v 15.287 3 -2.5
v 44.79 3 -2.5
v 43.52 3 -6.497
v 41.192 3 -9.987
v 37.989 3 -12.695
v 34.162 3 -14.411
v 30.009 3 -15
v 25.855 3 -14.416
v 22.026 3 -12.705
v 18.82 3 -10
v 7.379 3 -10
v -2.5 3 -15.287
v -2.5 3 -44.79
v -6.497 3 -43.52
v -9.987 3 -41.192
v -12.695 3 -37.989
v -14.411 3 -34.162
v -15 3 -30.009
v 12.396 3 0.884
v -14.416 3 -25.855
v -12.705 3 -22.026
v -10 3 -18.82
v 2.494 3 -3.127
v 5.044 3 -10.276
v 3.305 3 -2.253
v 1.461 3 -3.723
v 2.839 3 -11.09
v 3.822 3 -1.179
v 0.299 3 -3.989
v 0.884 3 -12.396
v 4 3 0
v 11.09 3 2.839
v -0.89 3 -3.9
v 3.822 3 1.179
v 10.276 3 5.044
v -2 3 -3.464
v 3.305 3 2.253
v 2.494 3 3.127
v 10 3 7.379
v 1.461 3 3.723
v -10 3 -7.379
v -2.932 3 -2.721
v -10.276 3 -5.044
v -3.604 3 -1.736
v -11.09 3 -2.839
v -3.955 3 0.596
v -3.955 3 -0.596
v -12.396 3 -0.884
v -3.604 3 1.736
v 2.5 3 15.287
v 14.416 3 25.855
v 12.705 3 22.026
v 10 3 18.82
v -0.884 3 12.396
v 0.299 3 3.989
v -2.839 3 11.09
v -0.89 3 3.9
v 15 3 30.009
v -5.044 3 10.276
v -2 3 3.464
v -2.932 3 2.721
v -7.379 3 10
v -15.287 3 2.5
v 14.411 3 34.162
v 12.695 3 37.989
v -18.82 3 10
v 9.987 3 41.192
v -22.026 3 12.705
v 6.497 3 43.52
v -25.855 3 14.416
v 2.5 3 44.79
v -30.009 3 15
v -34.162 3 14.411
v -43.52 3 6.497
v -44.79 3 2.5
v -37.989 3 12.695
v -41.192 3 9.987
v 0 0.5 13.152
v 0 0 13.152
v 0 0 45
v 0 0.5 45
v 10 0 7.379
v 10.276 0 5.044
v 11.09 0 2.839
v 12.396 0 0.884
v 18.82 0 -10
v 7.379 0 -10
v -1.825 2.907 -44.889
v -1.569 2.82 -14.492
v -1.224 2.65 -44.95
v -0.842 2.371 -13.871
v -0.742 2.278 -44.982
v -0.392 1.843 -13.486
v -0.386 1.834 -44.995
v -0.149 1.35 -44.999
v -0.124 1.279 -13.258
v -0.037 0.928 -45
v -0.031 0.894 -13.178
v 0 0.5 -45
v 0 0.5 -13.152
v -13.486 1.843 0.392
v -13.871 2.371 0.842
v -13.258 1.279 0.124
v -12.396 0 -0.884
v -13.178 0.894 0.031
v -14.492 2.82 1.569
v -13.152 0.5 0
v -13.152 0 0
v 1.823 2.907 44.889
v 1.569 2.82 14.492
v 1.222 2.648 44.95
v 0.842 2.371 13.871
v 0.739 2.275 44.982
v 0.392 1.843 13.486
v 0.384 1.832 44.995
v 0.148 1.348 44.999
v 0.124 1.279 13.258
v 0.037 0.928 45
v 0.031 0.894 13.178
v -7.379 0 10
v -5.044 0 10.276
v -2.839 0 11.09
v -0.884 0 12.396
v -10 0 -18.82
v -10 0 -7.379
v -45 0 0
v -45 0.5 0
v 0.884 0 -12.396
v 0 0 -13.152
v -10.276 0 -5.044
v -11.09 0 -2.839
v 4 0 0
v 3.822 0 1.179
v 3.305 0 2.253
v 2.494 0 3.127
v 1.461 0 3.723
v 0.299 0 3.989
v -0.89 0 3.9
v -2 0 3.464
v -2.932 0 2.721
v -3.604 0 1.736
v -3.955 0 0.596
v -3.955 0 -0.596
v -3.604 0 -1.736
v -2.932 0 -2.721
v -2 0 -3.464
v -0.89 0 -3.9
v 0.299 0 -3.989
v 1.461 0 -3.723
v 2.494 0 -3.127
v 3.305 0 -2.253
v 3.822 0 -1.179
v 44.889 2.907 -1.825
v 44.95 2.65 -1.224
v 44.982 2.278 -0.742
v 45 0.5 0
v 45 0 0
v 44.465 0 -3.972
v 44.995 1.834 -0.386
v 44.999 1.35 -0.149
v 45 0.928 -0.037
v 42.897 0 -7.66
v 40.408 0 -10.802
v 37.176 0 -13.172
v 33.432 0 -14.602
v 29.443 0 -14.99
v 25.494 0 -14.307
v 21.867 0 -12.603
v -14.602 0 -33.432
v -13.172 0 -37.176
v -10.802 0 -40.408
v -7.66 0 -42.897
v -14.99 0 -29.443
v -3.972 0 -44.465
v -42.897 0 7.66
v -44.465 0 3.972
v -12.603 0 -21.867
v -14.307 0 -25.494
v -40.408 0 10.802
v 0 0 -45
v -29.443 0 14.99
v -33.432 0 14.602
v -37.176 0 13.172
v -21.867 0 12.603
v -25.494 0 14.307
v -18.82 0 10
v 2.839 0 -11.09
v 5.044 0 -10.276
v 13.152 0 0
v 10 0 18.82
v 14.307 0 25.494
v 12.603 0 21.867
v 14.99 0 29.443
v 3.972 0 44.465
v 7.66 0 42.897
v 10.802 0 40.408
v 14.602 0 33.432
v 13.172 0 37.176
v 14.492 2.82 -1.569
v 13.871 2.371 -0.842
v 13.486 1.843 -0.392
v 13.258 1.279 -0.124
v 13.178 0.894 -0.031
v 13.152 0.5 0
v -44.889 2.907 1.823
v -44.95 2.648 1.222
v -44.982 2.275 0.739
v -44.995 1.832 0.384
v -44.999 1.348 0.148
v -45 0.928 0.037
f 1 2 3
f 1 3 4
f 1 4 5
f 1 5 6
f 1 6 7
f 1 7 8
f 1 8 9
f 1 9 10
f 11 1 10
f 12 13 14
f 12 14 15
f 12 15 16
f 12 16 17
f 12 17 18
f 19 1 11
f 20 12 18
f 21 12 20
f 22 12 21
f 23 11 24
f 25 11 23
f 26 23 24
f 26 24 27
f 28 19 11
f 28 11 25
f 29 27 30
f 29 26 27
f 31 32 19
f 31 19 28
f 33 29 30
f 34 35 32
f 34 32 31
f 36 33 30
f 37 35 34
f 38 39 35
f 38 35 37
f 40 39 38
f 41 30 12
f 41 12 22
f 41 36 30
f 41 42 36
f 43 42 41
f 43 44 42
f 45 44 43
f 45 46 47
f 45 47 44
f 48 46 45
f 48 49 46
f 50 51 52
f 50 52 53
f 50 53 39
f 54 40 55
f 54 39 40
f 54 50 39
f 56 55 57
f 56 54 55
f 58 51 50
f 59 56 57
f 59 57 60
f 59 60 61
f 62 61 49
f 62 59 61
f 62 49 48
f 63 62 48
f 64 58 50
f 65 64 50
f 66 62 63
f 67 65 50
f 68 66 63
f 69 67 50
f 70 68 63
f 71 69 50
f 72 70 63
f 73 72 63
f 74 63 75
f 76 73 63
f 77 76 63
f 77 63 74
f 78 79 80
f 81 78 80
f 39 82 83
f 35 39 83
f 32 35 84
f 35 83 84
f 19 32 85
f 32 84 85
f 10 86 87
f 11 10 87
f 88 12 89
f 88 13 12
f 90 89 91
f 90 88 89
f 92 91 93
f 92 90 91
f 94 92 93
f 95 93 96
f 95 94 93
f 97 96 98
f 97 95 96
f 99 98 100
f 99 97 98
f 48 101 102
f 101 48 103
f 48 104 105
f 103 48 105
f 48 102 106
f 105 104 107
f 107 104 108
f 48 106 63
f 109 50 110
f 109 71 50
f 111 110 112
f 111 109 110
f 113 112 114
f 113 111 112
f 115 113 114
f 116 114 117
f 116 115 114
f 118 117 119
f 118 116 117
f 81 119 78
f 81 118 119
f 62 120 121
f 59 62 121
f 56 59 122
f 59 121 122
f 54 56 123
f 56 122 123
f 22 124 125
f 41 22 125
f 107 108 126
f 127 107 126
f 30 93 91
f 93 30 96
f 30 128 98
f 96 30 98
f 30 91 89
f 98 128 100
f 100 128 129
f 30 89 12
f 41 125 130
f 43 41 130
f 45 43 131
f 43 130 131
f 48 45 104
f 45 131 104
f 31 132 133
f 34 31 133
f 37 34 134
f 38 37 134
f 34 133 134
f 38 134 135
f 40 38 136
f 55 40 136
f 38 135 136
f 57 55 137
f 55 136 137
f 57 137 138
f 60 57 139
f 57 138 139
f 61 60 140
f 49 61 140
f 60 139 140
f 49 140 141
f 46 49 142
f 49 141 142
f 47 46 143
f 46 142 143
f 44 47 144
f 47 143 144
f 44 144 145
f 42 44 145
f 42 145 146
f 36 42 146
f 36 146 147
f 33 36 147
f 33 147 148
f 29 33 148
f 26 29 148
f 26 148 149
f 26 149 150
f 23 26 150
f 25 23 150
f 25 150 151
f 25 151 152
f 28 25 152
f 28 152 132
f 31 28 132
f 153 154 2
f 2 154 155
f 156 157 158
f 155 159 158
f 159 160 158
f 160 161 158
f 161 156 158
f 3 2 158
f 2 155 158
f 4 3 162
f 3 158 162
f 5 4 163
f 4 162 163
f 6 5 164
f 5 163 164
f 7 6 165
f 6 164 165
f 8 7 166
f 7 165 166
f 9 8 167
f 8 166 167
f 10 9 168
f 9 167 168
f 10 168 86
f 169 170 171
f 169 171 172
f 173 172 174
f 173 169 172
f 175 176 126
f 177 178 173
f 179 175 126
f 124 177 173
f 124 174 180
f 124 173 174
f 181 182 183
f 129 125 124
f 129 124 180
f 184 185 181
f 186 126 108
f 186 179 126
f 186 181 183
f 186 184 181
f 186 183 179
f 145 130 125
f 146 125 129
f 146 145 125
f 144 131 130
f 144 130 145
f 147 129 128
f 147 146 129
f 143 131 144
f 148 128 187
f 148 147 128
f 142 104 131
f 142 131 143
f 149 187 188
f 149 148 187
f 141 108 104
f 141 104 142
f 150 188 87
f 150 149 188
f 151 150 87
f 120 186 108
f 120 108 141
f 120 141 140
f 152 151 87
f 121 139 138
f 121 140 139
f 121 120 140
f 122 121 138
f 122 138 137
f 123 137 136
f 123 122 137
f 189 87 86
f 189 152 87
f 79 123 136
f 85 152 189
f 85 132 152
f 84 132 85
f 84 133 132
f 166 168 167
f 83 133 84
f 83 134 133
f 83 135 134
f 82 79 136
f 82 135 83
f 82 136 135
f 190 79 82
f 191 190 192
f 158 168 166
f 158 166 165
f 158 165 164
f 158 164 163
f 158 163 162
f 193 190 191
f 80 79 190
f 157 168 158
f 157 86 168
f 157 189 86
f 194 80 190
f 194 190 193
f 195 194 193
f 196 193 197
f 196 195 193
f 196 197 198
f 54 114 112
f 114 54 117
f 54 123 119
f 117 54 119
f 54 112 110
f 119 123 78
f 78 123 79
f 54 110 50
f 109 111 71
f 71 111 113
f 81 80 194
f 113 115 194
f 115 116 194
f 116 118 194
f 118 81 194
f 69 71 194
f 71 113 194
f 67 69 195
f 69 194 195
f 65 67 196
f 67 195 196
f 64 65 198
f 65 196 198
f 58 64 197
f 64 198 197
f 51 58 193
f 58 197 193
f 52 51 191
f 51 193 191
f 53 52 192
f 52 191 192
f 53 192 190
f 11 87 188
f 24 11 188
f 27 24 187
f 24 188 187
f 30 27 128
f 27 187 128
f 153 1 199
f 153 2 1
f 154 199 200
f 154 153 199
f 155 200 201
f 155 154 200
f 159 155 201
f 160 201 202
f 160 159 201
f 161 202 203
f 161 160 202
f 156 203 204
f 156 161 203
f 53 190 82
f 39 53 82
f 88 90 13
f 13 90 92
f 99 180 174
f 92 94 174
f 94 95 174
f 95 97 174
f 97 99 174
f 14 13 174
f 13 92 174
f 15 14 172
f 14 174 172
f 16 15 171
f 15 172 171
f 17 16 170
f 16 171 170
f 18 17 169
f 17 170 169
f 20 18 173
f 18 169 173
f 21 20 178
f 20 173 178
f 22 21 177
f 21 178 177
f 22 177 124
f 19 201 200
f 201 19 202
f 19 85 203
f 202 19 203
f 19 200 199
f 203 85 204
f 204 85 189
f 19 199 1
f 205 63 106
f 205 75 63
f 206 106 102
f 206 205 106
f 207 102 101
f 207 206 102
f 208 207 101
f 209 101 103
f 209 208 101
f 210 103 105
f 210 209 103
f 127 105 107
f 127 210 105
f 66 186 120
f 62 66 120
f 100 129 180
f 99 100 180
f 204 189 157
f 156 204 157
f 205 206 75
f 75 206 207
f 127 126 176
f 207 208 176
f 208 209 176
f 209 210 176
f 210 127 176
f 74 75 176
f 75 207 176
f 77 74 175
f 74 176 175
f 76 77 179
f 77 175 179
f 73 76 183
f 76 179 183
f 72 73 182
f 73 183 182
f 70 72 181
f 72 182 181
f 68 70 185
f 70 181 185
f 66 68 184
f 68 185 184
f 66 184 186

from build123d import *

# Parameters (mm, degrees)
F0_R     = 3.75
F1_DEPTH = 5
F3_DEPTH = 3
F4_R     = 55.5278104075
F5_DEPTH = 5
F6_R     = 2.5
F7_R     = 4
F8_DEPTH = 3.0010001


with BuildPart() as f1:
    # F0 (on Front) → F1 (new body)
    with BuildSketch(Plane.XZ):
        with BuildLine():
            Line((10, 7.379066267), (10, 18.8196601125))
            ThreePointArc((10, 18.8196601125), (14.0125853844, 35.3523313466), (0, 45))
            Line((0, 45), (0, 43))
            ThreePointArc((0, 43), (11.7683072321, 35.5233092337), (10, 21.6933761371))
            Line((10, 21.6933761371), (0, 13.1515390832))
            Line((0, 13.1515390832), (-0.8841328604, 12.3963272004))
            ThreePointArc((-0.8841328604, 12.3963272004), (-3.9176162816, 10.618189727), (-7.379066267, 10))
            Line((-7.379066267, 10), (-18.8196601125, 10))
            ThreePointArc((-18.8196601125, 10), (-35.3523313466, 14.0125853844), (-45, 0))
            Line((-45, 0), (-43, 0))
            ThreePointArc((-43, 0), (-35.5233092337, 11.7683072321), (-21.6933761371, 10))
            Line((-21.6933761371, 10), (-12.3963272004, -0.8841328604))
            ThreePointArc((-12.3963272004, -0.8841328604), (-10.618189727, -3.9176162816), (-10, -7.379066267))
            Line((-10, -7.379066267), (-10, -18.8196601125))
            ThreePointArc((-10, -18.8196601125), (-14.0125853844, -35.3523313466), (0, -45))
            Line((0, -45), (0, -43))
            ThreePointArc((0, -43), (-11.7683072321, -35.5233092337), (-10, -21.6933761371))
            Line((-10, -21.6933761371), (0.8841328604, -12.3963272004))
            ThreePointArc((0.8841328604, -12.3963272004), (3.9176162816, -10.618189727), (7.379066267, -10))
            Line((7.379066267, -10), (18.8196601125, -10))
            ThreePointArc((18.8196601125, -10), (35.3523313466, -14.0125853844), (45, 0))
            Line((45, 0), (43, 0))
            ThreePointArc((43, 0), (35.5233092337, -11.7683072321), (21.6933761371, -10))
            Line((21.6933761371, -10), (12.3963272004, 0.8841328604))
            ThreePointArc((12.3963272004, 0.8841328604), (10.618189727, 3.9176162816), (10, 7.379066267))
        make_face()
        Circle(F0_R, mode=Mode.SUBTRACT)
    extrude(amount=F1_DEPTH)

    # F2 (on face) → F3 (join)
    with BuildSketch(Plane(origin=(0, 0, 0), x_dir=(-1, 0, 0), z_dir=(0, 1, 0))):
        with BuildLine():
            Line((0, 43), (0, 45))
            ThreePointArc((0, 45), (-14.0125853844, 35.3523313466), (-10, 18.8196601125))
            Line((-10, 18.8196601125), (-10, 7.379066267))
            ThreePointArc((-10, 7.379066267), (-10.618189727, 3.9176162816), (-12.3963272004, 0.8841328604))
            Line((-12.3963272004, 0.8841328604), (-13.1515390832, 0))
            Line((-13.1515390832, 0), (-9.8753882025, 0))
            Line((-9.8753882025, 0), (-3.75, 0))
            ThreePointArc((-3.75, 0), (-2.6516504294, 2.6516504294), (0, 3.75))
            Line((0, 3.75), (0, 9.8753882025))
            Line((0, 9.8753882025), (0, 13.1515390832))
            Line((0, 13.1515390832), (-10, 21.6933761371))
            ThreePointArc((-10, 21.6933761371), (-11.7683072321, 35.5233092337), (0, 43))
        make_face()
        with BuildLine():
            Line((0, 13.1515390832), (0, 43))
            ThreePointArc((0, 43), (-11.7683072321, 35.5233092337), (-10, 21.6933761371))
            Line((-10, 21.6933761371), (0, 13.1515390832))
        make_face()
        with BuildLine():
            Line((0.8841328604, 12.3963272004), (0, 13.1515390832))
            Line((0, 13.1515390832), (0, 9.8753882025))
            Line((0, 9.8753882025), (0, 3.75))
            ThreePointArc((0, 3.75), (2.6516504294, 2.6516504294), (3.75, 0))
            Line((3.75, 0), (9.8753882025, 0))
            Line((9.8753882025, 0), (13.1515390832, 0))
            Line((13.1515390832, 0), (21.6933761371, 10))
            ThreePointArc((21.6933761371, 10), (35.5233092337, 11.7683072321), (43, 0))
            Line((43, 0), (45, 0))
            ThreePointArc((45, 0), (35.3523313466, 14.0125853844), (18.8196601125, 10))
            Line((18.8196601125, 10), (7.379066267, 10))
            ThreePointArc((7.379066267, 10), (3.9176162816, 10.618189727), (0.8841328604, 12.3963272004))
        make_face()
        with BuildLine():
            Line((-21.6933761371, -10), (-13.1515390832, 0))
            Line((-13.1515390832, 0), (-43, 0))
            ThreePointArc((-43, 0), (-35.5233092337, -11.7683072321), (-21.6933761371, -10))
        make_face()
        with BuildLine():
            Line((-9.8753882025, 0), (-13.1515390832, 0))
            Line((-13.1515390832, 0), (-21.6933761371, -10))
            ThreePointArc((-21.6933761371, -10), (-35.5233092337, -11.7683072321), (-43, 0))
            Line((-43, 0), (-45, 0))
            ThreePointArc((-45, 0), (-35.3523313466, -14.0125853844), (-18.8196601125, -10))
            Line((-18.8196601125, -10), (-7.379066267, -10))
            ThreePointArc((-7.379066267, -10), (-3.9176162816, -10.618189727), (-0.8841328604, -12.3963272004))
            Line((-0.8841328604, -12.3963272004), (0, -13.1515390832))
            Line((0, -13.1515390832), (0, -9.8753882025))
            Line((0, -9.8753882025), (0, -3.75))
            ThreePointArc((0, -3.75), (-2.6516504294, -2.6516504294), (-3.75, 0))
            Line((-3.75, 0), (-9.8753882025, 0))
        make_face()
        with BuildLine():
            ThreePointArc((3.75, 0), (2.6516504294, 2.6516504294), (0, 3.75))
            ThreePointArc((0, 3.75), (-2.6516504294, 2.6516504294), (-3.75, 0))
            ThreePointArc((-3.75, 0), (-2.6516504294, -2.6516504294), (0, -3.75))
            ThreePointArc((0, -3.75), (2.6516504294, -2.6516504294), (3.75, 0))
        make_face()
        with BuildLine():
            Line((9.8753882025, 0), (3.75, 0))
            ThreePointArc((3.75, 0), (2.6516504294, -2.6516504294), (0, -3.75))
            Line((0, -3.75), (0, -9.8753882025))
            Line((0, -9.8753882025), (0, -13.1515390832))
            Line((0, -13.1515390832), (10, -21.6933761371))
            ThreePointArc((10, -21.6933761371), (11.7683072321, -35.5233092337), (0, -43))
            Line((0, -43), (0, -45))
            ThreePointArc((0, -45), (14.0125853844, -35.3523313466), (10, -18.8196601125))
            Line((10, -18.8196601125), (10, -7.379066267))
            ThreePointArc((10, -7.379066267), (10.618189727, -3.9176162816), (12.3963272004, -0.8841328604))
            Line((12.3963272004, -0.8841328604), (13.1515390832, 0))
            Line((13.1515390832, 0), (9.8753882025, 0))
        make_face()
        with BuildLine():
            Line((21.6933761371, 10), (13.1515390832, 0))
            Line((13.1515390832, 0), (43, 0))
            ThreePointArc((43, 0), (35.5233092337, 11.7683072321), (21.6933761371, 10))
        make_face()
        with BuildLine():
            Line((10, -21.6933761371), (0, -13.1515390832))
            Line((0, -13.1515390832), (0, -43))
            ThreePointArc((0, -43), (11.7683072321, -35.5233092337), (10, -21.6933761371))
        make_face()
    extrude(amount=F3_DEPTH)

    # F4 (on face) → F5 (cut)
    with BuildSketch(Plane.XZ.offset(5)):
        Circle(F4_R)
    extrude(amount=-F5_DEPTH, mode=Mode.SUBTRACT)

    # F6
    f6_edges = [f1.edges().sort_by_distance(p)[0] for p in [
        (29.07577, 3, 0),
        (0, 3, 29.07577),
        (-29.07577, 3, 0),
        (0, 3, -29.07577),
    ]]
    fillet(f6_edges, radius=F6_R)

    # F7 (on face) → F8 (cut, through all)
    with BuildSketch(Plane.XZ):
        Circle(F7_R)
    extrude(amount=-F8_DEPTH, mode=Mode.SUBTRACT)


solid = f1.part
